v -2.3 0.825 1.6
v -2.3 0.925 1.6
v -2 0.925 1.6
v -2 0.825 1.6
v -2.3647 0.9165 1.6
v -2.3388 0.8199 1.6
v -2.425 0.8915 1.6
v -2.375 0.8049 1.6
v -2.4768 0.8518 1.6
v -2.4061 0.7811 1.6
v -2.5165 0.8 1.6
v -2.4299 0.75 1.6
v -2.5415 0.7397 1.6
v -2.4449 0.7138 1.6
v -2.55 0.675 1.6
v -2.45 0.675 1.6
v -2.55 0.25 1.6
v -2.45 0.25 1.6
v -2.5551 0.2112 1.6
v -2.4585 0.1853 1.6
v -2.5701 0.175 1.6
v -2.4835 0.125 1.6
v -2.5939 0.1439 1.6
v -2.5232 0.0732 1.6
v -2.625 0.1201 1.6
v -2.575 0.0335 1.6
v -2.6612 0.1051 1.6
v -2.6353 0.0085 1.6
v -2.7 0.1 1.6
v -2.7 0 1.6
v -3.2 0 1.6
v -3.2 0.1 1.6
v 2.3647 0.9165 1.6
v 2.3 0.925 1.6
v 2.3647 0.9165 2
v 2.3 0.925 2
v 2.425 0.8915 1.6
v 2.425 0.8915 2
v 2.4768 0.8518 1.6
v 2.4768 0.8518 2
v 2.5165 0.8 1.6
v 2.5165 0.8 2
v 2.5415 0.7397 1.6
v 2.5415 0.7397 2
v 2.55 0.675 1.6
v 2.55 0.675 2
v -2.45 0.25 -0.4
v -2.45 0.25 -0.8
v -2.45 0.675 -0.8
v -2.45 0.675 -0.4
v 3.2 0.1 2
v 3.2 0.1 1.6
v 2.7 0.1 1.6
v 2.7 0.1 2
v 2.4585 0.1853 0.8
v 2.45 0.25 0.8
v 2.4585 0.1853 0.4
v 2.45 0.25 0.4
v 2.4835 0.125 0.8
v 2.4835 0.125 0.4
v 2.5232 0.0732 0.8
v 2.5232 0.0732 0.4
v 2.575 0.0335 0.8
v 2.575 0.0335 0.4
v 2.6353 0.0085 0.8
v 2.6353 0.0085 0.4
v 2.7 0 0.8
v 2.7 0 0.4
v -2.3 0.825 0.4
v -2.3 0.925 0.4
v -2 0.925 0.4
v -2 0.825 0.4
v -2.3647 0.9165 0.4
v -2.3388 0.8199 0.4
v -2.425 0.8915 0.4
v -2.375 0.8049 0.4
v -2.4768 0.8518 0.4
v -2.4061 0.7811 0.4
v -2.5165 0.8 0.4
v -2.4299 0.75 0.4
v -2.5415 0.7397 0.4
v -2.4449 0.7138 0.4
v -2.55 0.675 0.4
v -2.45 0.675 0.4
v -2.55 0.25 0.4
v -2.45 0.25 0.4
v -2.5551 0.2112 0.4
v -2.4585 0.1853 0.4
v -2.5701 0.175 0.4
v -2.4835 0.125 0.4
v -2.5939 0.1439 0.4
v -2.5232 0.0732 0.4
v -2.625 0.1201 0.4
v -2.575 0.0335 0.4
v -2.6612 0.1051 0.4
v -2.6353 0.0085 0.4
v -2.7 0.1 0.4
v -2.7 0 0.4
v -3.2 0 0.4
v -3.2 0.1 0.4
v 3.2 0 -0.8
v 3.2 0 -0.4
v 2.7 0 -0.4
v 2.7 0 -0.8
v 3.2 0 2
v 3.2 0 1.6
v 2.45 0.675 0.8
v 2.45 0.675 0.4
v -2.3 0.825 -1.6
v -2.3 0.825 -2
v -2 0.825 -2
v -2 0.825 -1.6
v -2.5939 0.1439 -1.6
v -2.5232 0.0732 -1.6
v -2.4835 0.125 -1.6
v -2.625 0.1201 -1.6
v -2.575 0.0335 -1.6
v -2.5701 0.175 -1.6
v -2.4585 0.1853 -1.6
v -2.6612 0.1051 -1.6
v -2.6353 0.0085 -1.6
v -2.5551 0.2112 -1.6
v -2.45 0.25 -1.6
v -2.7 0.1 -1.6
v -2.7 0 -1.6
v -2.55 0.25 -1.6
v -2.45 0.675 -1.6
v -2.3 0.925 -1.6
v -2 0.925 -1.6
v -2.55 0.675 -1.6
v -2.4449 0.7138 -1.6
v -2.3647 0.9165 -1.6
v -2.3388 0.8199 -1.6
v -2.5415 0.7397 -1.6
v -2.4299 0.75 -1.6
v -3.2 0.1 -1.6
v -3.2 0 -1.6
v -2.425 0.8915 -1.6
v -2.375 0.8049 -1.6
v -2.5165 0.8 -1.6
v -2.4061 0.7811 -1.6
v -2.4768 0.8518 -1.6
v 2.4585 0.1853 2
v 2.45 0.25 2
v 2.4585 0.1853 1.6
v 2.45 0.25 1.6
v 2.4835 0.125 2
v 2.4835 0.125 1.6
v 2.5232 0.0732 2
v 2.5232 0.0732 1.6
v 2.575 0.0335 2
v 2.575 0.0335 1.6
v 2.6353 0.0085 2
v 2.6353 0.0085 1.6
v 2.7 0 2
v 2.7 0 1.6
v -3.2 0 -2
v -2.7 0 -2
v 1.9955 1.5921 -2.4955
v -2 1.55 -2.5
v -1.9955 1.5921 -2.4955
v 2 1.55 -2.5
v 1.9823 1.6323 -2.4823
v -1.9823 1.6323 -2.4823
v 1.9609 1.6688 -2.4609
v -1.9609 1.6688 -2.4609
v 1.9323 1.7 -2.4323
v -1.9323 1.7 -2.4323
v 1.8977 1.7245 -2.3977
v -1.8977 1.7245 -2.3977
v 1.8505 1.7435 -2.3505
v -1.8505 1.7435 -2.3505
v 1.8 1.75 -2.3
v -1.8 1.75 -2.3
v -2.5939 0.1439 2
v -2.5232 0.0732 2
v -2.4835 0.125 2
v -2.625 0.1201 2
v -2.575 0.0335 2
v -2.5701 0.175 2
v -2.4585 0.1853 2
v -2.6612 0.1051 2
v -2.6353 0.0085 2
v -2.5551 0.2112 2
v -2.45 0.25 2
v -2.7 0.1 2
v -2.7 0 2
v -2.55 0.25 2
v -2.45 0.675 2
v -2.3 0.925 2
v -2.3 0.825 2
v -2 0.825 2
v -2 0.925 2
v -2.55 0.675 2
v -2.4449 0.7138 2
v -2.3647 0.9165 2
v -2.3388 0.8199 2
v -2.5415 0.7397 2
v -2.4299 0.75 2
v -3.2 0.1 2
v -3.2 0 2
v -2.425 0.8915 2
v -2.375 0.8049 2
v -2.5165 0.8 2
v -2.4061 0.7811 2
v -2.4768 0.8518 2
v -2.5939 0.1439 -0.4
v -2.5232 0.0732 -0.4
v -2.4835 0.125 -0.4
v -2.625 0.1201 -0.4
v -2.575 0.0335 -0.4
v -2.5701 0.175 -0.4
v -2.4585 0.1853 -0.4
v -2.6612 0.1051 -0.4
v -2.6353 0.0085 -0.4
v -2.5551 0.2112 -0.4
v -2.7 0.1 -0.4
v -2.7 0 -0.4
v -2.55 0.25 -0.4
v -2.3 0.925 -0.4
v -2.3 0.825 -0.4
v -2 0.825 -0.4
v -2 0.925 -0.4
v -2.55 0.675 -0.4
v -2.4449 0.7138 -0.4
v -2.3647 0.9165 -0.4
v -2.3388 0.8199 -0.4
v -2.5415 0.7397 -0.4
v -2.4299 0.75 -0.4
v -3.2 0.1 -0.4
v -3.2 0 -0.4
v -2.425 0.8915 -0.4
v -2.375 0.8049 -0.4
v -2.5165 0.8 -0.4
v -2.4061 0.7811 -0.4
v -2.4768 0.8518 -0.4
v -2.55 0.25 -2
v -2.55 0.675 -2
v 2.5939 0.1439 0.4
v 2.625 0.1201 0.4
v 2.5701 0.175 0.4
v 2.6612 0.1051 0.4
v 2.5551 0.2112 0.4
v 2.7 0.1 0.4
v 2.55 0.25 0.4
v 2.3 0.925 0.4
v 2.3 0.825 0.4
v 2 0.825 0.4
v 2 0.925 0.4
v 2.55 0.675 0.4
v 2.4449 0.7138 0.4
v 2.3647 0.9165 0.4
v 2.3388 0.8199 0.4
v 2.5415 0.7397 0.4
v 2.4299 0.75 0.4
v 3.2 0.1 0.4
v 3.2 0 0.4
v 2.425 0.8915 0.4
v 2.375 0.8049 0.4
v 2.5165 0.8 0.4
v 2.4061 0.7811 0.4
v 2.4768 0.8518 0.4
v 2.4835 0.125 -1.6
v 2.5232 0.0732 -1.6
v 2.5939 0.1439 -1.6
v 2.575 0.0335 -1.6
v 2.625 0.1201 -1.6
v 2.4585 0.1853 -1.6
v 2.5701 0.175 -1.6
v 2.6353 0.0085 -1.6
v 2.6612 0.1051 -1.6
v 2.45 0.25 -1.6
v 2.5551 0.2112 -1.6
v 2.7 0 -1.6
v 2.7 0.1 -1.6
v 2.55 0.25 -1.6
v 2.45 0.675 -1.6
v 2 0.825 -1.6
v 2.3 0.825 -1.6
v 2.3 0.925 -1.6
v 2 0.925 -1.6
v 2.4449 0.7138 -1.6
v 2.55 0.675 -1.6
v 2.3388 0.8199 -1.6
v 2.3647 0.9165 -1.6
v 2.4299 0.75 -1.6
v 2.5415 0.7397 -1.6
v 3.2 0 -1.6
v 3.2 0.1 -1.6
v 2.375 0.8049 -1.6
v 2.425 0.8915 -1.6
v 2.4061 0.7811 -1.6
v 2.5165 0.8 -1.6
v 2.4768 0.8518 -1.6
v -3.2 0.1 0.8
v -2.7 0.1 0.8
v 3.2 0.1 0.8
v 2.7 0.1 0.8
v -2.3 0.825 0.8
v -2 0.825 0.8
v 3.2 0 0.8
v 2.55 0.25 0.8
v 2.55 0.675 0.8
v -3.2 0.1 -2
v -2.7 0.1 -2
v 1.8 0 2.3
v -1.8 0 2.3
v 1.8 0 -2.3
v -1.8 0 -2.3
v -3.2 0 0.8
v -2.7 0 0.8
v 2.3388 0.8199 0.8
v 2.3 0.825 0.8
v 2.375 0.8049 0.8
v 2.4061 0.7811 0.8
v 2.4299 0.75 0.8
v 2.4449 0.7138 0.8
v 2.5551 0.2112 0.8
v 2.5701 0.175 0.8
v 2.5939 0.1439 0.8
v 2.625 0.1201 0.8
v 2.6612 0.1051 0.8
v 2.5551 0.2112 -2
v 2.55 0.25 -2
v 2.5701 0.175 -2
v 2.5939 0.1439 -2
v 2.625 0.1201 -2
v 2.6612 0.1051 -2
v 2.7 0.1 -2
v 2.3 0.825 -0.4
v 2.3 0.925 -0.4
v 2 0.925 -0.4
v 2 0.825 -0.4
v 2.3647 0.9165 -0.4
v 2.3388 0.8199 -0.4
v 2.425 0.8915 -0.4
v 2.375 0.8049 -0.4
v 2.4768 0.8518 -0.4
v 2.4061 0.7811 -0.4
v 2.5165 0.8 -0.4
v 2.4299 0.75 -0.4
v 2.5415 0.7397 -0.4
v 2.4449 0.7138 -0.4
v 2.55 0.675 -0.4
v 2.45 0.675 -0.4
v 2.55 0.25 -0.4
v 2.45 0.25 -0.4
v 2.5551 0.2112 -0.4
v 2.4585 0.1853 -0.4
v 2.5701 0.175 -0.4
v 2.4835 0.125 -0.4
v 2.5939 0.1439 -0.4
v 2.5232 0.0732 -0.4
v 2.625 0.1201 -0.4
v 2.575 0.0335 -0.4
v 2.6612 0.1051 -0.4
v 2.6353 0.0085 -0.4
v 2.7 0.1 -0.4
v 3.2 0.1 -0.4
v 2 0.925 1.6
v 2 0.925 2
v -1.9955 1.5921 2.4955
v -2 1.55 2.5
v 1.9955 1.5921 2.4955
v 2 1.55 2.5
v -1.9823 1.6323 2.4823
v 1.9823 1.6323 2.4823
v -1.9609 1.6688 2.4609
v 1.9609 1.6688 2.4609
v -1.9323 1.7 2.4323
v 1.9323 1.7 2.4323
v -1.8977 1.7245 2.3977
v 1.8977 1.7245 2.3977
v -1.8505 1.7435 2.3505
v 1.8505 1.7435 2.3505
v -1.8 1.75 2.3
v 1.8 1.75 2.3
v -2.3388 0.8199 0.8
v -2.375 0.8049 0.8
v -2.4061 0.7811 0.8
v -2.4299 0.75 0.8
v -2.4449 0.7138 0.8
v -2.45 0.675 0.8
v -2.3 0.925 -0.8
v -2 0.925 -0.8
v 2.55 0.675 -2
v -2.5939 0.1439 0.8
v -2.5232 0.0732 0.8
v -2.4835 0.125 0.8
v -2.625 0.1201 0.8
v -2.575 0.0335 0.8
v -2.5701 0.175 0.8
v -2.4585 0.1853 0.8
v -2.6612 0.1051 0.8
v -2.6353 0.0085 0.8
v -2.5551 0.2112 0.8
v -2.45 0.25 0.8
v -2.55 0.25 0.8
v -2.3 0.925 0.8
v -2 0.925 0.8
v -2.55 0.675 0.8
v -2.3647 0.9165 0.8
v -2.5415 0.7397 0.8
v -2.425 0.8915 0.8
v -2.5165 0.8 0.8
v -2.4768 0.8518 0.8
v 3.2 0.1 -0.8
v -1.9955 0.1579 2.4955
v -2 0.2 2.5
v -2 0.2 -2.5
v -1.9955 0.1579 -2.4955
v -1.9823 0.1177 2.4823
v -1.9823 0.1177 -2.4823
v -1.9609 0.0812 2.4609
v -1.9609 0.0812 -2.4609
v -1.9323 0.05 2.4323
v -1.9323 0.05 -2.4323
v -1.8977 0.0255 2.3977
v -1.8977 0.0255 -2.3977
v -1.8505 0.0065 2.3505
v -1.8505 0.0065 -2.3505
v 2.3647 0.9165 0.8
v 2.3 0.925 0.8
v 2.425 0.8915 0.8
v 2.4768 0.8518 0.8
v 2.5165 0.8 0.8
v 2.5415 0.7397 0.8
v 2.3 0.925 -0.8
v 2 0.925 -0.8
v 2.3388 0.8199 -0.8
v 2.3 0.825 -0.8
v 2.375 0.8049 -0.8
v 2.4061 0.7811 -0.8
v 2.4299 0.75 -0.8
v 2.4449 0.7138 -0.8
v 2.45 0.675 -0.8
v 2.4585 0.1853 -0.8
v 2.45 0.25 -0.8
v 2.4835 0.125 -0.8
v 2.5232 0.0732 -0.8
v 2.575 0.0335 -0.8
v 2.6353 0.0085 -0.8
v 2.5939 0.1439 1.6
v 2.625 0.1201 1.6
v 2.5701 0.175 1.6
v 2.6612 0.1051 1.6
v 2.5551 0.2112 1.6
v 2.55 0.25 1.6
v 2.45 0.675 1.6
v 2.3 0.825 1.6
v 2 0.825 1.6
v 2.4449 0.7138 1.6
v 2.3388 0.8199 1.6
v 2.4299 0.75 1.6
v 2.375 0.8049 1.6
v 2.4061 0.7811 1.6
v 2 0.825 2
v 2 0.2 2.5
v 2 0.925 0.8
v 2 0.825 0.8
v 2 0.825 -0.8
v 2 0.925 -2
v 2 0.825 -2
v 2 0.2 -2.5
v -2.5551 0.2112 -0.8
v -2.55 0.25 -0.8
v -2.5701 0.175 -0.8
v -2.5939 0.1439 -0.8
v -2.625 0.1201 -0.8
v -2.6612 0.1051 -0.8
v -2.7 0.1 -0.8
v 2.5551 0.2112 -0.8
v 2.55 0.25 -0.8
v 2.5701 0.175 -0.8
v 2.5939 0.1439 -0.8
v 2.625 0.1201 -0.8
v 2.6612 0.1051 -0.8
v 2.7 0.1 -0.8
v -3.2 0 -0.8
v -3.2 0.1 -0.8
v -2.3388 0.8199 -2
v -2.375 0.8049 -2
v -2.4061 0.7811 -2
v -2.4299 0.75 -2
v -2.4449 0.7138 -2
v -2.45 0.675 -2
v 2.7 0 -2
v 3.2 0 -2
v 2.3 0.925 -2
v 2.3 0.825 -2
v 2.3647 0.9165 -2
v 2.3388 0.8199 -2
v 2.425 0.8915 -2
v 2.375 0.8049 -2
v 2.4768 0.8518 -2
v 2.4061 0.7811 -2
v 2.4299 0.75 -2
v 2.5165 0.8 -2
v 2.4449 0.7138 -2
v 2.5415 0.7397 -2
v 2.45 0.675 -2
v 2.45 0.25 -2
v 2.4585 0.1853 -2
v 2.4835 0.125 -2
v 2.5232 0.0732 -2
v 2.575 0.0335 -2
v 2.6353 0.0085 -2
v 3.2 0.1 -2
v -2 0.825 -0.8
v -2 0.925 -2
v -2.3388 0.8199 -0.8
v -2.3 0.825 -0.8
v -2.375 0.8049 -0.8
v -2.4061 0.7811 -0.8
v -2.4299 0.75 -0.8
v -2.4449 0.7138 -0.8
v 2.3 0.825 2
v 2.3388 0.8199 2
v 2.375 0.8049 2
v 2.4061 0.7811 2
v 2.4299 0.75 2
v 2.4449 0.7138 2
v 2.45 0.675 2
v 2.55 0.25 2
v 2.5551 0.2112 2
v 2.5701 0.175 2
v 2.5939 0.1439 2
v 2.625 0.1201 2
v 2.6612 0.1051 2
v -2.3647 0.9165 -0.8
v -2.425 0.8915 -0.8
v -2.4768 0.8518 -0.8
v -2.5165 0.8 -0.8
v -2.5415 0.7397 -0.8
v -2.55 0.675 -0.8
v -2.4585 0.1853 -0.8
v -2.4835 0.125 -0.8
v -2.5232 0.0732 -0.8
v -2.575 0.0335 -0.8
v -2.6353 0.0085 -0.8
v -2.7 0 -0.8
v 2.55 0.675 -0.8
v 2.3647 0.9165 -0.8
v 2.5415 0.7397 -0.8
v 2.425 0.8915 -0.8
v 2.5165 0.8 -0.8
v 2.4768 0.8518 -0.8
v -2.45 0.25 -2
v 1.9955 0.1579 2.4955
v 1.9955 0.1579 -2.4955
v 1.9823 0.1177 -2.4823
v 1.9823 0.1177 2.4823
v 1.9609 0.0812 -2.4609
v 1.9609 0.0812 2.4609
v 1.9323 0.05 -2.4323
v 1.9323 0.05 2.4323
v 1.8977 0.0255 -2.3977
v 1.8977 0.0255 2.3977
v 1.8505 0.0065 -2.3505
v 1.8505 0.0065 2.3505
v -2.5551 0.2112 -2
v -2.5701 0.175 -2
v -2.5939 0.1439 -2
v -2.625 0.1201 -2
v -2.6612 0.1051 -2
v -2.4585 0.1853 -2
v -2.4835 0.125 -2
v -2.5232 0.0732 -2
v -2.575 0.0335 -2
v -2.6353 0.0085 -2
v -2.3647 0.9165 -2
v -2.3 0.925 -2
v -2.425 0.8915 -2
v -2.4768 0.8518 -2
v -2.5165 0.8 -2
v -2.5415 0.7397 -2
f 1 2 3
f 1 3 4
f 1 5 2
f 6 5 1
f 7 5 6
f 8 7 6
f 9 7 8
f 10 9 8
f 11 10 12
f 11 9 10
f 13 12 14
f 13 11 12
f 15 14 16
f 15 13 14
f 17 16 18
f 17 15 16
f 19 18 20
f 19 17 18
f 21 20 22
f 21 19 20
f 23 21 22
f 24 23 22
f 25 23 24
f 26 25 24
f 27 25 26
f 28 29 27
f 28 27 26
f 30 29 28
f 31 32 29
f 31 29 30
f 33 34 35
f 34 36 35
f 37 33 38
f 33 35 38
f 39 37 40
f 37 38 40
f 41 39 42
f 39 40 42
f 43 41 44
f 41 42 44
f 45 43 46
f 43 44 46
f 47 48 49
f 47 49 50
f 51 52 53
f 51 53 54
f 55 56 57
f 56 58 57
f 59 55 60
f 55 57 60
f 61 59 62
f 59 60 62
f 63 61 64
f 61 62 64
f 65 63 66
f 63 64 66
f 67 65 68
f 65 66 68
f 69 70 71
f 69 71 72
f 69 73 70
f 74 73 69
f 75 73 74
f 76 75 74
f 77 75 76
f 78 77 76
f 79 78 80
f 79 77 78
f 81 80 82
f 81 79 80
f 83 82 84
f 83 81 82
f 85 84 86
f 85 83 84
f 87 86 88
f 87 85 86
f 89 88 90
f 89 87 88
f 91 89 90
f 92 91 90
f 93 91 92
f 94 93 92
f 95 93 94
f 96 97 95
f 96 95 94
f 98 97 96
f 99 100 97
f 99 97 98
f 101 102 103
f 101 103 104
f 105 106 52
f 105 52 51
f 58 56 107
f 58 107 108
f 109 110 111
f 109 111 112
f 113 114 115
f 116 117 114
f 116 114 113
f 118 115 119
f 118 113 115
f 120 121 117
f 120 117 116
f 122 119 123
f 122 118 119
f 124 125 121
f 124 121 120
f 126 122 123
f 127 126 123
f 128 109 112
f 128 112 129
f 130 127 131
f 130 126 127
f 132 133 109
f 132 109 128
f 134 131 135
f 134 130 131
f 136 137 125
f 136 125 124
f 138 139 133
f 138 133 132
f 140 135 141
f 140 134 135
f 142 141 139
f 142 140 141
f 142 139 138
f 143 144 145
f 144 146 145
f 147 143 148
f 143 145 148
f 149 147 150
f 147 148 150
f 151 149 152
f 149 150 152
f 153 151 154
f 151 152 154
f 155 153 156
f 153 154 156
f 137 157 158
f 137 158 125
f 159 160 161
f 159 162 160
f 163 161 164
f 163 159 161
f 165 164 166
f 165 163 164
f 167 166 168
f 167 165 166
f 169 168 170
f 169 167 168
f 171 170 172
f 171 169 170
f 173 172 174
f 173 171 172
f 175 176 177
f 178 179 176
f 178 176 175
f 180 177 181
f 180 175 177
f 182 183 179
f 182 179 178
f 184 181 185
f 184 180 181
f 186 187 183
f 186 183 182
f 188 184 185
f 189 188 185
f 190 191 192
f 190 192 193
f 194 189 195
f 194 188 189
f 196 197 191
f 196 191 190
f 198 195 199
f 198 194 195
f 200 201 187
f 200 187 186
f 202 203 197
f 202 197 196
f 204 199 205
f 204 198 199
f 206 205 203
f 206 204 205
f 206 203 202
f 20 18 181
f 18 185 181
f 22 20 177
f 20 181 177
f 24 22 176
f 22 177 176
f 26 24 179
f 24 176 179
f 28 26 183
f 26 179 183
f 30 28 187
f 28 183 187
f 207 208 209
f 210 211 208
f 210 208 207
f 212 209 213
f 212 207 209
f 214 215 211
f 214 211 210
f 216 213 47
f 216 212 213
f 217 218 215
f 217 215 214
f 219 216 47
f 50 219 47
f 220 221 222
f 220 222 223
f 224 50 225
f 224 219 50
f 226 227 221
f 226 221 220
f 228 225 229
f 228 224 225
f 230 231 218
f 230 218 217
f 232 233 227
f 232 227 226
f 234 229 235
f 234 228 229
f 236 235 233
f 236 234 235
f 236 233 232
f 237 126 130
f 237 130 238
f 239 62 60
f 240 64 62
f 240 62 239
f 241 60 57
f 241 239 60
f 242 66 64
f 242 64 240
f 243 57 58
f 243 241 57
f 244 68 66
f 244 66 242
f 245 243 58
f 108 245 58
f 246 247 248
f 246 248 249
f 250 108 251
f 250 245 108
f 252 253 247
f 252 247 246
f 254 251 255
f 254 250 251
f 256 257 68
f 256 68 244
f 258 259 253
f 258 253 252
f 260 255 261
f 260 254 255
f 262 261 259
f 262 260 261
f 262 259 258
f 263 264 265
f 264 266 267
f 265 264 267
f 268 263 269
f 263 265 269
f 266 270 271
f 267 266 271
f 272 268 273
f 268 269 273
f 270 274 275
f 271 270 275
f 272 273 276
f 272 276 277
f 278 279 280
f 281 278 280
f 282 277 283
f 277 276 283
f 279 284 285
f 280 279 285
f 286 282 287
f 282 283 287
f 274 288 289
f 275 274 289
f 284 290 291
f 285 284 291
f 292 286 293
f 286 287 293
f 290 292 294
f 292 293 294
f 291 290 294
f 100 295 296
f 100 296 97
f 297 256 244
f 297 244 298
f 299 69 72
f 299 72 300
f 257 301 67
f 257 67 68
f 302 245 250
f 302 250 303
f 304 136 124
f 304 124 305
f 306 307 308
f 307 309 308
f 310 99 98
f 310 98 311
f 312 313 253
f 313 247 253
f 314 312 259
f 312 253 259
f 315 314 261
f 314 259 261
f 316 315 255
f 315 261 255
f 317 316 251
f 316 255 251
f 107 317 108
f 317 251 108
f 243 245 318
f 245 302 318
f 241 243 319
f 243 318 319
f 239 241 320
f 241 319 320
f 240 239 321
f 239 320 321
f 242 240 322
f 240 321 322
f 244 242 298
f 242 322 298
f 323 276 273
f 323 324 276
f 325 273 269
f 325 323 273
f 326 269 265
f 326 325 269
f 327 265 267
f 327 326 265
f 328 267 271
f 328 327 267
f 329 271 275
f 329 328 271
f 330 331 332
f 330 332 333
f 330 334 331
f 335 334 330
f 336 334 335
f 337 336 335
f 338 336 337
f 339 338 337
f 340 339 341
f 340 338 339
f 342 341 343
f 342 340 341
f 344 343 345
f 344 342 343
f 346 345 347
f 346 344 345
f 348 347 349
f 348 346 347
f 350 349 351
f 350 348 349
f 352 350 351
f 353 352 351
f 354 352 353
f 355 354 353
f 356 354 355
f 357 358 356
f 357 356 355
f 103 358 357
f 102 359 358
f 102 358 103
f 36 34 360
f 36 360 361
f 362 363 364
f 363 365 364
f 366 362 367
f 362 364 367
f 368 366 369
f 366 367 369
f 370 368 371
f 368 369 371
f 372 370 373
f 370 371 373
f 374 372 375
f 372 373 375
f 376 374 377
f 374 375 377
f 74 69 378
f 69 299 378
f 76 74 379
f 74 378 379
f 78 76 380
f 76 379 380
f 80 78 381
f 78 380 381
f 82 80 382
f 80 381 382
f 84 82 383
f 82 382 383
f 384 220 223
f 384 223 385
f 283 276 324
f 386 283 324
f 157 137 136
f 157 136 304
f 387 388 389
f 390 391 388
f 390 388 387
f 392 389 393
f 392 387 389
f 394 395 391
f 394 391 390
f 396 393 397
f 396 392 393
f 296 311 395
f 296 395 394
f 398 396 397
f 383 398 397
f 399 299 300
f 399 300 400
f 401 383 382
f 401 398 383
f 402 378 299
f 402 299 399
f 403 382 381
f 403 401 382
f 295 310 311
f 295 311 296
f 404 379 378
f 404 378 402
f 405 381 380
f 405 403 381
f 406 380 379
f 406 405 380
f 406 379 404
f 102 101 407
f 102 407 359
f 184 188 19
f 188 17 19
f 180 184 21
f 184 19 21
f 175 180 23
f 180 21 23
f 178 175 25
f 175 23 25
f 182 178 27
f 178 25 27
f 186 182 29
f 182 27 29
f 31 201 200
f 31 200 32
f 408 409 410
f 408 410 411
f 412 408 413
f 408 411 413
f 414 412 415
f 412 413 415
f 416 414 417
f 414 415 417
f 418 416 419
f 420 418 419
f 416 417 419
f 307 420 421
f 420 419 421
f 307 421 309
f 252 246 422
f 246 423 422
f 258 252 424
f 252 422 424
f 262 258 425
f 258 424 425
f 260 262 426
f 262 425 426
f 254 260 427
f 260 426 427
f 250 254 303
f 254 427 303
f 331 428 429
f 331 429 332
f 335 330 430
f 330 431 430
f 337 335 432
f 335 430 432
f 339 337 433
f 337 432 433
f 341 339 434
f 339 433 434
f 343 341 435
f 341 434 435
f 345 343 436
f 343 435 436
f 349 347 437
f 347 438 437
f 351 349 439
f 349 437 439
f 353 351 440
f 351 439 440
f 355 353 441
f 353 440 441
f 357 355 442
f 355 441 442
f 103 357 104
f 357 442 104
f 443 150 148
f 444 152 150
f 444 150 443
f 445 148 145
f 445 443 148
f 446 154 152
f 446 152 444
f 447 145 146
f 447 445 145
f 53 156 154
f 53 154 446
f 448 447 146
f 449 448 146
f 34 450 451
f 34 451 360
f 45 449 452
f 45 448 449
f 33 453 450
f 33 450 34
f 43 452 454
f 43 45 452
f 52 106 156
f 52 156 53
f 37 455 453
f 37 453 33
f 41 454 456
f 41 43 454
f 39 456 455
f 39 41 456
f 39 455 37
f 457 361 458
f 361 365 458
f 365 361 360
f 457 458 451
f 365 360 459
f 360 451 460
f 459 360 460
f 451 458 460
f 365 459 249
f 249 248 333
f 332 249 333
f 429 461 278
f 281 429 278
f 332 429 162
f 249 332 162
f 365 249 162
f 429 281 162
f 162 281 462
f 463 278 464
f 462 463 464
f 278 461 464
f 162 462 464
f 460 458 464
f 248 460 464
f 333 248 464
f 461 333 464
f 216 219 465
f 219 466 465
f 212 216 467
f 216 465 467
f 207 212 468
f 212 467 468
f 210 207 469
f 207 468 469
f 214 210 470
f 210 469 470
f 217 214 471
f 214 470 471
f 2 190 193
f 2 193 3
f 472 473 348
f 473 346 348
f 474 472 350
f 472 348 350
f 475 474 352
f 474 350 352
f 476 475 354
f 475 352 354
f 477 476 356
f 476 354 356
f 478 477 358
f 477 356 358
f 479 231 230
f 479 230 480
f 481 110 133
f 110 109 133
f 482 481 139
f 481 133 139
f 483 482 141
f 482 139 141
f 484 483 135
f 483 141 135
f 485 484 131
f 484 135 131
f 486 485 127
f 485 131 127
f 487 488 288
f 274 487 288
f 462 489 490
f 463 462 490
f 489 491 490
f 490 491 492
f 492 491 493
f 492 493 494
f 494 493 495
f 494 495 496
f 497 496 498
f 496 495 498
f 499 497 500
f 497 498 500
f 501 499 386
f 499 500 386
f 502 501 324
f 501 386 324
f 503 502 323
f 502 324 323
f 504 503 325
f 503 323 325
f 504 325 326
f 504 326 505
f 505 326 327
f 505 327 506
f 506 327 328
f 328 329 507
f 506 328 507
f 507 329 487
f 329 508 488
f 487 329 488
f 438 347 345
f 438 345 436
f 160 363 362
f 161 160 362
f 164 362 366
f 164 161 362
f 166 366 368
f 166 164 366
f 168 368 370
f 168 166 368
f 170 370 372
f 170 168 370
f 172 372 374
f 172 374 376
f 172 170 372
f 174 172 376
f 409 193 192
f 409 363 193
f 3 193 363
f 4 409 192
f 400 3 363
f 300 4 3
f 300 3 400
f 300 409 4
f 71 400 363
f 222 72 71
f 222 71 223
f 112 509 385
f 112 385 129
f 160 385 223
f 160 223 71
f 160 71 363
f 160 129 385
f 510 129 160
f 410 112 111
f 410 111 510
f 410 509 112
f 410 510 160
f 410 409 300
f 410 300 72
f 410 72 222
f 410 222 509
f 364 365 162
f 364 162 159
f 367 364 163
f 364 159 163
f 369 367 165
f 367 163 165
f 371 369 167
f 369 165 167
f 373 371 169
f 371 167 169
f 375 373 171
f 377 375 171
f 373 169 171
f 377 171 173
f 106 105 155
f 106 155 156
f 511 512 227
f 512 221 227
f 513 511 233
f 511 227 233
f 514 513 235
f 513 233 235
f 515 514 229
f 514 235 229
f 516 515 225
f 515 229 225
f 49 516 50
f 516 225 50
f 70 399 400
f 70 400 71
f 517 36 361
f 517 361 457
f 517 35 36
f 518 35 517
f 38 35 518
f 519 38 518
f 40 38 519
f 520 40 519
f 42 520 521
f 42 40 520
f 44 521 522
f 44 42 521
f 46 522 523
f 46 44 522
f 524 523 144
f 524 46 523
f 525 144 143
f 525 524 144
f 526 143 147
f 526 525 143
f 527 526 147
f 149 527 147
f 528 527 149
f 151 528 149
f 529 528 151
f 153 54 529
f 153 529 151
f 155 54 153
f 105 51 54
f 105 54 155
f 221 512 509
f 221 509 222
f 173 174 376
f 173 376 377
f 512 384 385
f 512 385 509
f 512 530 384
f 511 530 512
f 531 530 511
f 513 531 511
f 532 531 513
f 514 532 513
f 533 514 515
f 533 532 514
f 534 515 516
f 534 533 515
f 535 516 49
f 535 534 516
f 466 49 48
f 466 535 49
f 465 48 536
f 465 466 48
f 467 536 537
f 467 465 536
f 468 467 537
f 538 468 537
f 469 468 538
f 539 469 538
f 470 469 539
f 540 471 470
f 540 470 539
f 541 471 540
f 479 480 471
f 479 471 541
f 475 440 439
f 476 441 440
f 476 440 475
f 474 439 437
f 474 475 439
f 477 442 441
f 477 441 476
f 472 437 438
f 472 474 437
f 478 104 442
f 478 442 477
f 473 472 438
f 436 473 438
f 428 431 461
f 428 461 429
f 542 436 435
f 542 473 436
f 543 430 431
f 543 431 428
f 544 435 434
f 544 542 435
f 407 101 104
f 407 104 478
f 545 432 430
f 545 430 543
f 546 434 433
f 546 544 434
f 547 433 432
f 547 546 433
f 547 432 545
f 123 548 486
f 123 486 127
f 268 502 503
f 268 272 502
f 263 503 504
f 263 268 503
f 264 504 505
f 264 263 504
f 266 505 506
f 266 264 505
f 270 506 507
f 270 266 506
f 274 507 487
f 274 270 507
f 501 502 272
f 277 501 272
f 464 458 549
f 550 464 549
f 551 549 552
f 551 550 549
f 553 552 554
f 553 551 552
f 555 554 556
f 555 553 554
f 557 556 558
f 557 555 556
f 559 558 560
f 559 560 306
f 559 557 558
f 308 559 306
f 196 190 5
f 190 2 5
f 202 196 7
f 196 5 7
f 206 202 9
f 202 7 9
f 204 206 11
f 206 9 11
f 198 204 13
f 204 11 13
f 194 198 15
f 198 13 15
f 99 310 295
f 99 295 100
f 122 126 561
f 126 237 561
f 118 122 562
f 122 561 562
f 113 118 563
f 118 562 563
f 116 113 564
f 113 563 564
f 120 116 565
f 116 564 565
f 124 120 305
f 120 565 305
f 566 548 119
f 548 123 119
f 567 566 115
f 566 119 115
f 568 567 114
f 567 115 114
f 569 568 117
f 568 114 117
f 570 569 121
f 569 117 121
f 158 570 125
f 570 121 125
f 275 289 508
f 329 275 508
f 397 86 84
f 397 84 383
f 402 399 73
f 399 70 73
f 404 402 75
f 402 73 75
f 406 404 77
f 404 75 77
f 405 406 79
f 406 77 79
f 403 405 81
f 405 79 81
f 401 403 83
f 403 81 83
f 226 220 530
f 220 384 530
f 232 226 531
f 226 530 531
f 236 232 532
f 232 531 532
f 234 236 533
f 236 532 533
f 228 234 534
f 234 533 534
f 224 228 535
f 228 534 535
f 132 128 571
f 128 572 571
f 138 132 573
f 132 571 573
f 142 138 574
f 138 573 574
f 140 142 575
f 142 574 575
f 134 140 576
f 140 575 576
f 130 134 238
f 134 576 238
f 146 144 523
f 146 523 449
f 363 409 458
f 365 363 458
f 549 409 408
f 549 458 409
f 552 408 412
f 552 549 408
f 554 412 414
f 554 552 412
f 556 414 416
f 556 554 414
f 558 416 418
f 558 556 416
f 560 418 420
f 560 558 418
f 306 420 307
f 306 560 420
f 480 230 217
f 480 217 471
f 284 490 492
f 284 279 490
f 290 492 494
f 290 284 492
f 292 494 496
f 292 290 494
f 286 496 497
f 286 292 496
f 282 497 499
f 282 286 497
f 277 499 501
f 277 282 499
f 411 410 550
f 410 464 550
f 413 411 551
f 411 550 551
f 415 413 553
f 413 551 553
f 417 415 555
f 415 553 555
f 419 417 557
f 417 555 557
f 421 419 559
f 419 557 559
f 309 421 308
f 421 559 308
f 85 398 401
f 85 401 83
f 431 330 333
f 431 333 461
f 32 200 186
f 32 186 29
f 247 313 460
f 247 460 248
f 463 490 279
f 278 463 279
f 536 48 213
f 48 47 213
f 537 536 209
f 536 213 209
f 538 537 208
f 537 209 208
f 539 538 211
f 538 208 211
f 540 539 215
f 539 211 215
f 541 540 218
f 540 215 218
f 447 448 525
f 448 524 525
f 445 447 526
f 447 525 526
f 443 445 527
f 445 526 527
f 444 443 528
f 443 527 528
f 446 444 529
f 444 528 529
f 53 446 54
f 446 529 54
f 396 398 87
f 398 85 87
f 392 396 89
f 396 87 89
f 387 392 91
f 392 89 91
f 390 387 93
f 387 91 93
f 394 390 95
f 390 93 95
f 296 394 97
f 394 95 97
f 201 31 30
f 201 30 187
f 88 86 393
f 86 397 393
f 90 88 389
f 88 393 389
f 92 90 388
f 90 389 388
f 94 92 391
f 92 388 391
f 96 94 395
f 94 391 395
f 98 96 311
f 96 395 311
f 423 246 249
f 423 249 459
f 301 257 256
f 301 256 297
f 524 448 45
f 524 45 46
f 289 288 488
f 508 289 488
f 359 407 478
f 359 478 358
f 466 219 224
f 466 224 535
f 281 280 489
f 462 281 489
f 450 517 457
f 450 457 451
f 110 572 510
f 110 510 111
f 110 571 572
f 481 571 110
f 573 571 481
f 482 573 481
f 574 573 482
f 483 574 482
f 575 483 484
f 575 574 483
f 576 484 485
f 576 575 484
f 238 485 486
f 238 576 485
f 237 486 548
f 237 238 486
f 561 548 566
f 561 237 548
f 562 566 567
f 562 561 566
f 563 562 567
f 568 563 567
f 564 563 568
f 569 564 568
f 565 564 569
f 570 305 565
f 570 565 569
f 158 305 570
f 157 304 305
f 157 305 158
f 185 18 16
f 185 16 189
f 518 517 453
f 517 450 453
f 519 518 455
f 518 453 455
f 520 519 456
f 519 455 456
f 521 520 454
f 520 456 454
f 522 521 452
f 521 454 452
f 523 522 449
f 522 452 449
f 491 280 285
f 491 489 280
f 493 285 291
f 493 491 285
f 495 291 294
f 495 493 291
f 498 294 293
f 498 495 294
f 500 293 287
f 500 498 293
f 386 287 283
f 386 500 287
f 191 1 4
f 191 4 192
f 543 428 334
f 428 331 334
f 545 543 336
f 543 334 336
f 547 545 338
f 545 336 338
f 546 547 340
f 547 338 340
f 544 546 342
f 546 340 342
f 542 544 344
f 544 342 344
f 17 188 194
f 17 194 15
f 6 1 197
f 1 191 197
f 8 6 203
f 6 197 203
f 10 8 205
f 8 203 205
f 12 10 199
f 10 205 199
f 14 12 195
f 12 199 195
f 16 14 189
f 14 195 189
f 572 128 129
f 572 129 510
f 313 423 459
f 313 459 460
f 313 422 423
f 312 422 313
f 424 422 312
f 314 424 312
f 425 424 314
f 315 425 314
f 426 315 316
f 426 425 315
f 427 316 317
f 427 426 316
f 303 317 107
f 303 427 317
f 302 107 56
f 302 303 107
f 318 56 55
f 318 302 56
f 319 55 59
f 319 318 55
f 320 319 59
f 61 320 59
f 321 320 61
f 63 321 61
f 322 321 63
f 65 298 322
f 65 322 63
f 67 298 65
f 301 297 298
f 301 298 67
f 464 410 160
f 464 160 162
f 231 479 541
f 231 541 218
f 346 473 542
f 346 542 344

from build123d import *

# Parameters (mm, degrees)
SKETCH1_W               = 4
SKETCH1_H               = 5
BOSS_EXTRUDE1_DEPTH     = 1.75
FILLET1_R               = 0.2
SKETCH3_W               = 0.4
SKETCH3_H               = 0.1
LPATTERN1_COUNT         = 4
LPATTERN1_PITCH         = 1.2
MIRROR1_COPY_1_SKETCH_W = 0.4
MIRROR1_COPY_1_SKETCH_H = 0.1
MIRROR1_COPY_2_SKETCH_W = 0.4
MIRROR1_COPY_2_SKETCH_H = 0.1
MIRROR1_COPY_3_SKETCH_W = 0.4
MIRROR1_COPY_3_SKETCH_H = 0.1


with BuildPart() as part:
    # Sketch1 → Boss-Extrude1 (new body)
    with BuildSketch(Plane(origin=(0, 0, 0), x_dir=(1, 0, 0), z_dir=(0, 1, 0))):
        Rectangle(SKETCH1_W, SKETCH1_H)
    extrude(amount=BOSS_EXTRUDE1_DEPTH)

    # Fillet1
    fillet1_edges = [part.edges().sort_by_distance(p)[0] for p in [
        (-2, 1.75, 0),
        (0, 1.75, 2.5),
        (2, 1.75, 0),
        (0, 0, 2.5),
        (-2, 0, 0),
        (0, 0, -2.5),
        (2, 0, 0),
        (0, 1.75, -2.5),
    ]]
    fillet(fillet1_edges, radius=FILLET1_R)

    # Sweep1: sweep along a path in Sketch2
    with BuildLine(Plane(origin=(0, 0, -1.8), x_dir=(-1, 0, 0), z_dir=(0, 0, -1))) as sweep1_path:
        Line((2, 0.875), (2.3, 0.875))
        ThreePointArc((2.3, 0.875), (2.441421356, 0.816421356), (2.5, 0.675))
        Line((2.5, 0.675), (2.5, 0.25))
        ThreePointArc((2.5, 0.25), (2.558578644, 0.108578644), (2.7, 0.05))
        Line((2.7, 0.05), (3.2, 0.05))
    # Sketch3 → Sweep1 (sweep)
    with BuildSketch(Plane.ZY.offset(2)):
        with Locations((-1.8, 0.875)):
            Rectangle(SKETCH3_W, SKETCH3_H)
    sweep1 = sweep(path=sweep1_path.line)

    # LPattern1: Sweep1 ×4
    with Locations(*[(0, 0, i * LPATTERN1_PITCH) for i in range(1, LPATTERN1_COUNT)]):
        add(sweep1)

    # Mirror1: Sweep1 across plane
    add(sweep1.mirror(Plane(origin=(0, 0, 0), x_dir=(0, 0, 1), z_dir=(1, 0, 0))))

    # Mirror1 copy 1: sweep along a path in Mirror1 copy 1 path
    with BuildLine(Plane(origin=(0, 0, -0.6), x_dir=(1, 0, 0), z_dir=(0, 0, -1))) as mirror1_copy_1_path:
        Line((2, -0.875), (2.3, -0.875))
        ThreePointArc((2.3, -0.875), (2.441421356, -0.816421356), (2.5, -0.675))
        Line((2.5, -0.675), (2.5, -0.25))
        ThreePointArc((2.5, -0.25), (2.558578644, -0.108578644), (2.7, -0.05))
        Line((2.7, -0.05), (3.2, -0.05))
    # Mirror1 copy 1 sketch → Mirror1 copy 1 (sweep)
    with BuildSketch(Plane(origin=(2, 0, 1.2), x_dir=(0, 0, 1), z_dir=(1, 0, 0))):
        with Locations((-1.8, -0.875)):
            Rectangle(MIRROR1_COPY_1_SKETCH_W, MIRROR1_COPY_1_SKETCH_H)
    sweep(path=mirror1_copy_1_path.line)

    # Mirror1 copy 2: sweep along a path in Mirror1 copy 2 path
    with BuildLine(Plane(origin=(0, 0, 0.6), x_dir=(1, 0, 0), z_dir=(0, 0, -1))) as mirror1_copy_2_path:
        Line((2, -0.875), (2.3, -0.875))
        ThreePointArc((2.3, -0.875), (2.441421356, -0.816421356), (2.5, -0.675))
        Line((2.5, -0.675), (2.5, -0.25))
        ThreePointArc((2.5, -0.25), (2.558578644, -0.108578644), (2.7, -0.05))
        Line((2.7, -0.05), (3.2, -0.05))
    # Mirror1 copy 2 sketch → Mirror1 copy 2 (sweep)
    with BuildSketch(Plane(origin=(2, 0, 2.4), x_dir=(0, 0, 1), z_dir=(1, 0, 0))):
        with Locations((-1.8, -0.875)):
            Rectangle(MIRROR1_COPY_2_SKETCH_W, MIRROR1_COPY_2_SKETCH_H)
    sweep(path=mirror1_copy_2_path.line)

    # Mirror1 copy 3: sweep along a path in Mirror1 copy 3 path
    with BuildLine(Plane(origin=(0, 0, 1.8), x_dir=(1, 0, 0), z_dir=(0, 0, -1))) as mirror1_copy_3_path:
        Line((2, -0.875), (2.3, -0.875))
        ThreePointArc((2.3, -0.875), (2.441421356, -0.816421356), (2.5, -0.675))
        Line((2.5, -0.675), (2.5, -0.25))
        ThreePointArc((2.5, -0.25), (2.558578644, -0.108578644), (2.7, -0.05))
        Line((2.7, -0.05), (3.2, -0.05))
    # Mirror1 copy 3 sketch → Mirror1 copy 3 (sweep)
    with BuildSketch(Plane(origin=(2, 0, 3.6), x_dir=(0, 0, 1), z_dir=(1, 0, 0))):
        with Locations((-1.8, -0.875)):
            Rectangle(MIRROR1_COPY_3_SKETCH_W, MIRROR1_COPY_3_SKETCH_H)
    sweep(path=mirror1_copy_3_path.line)


solid = part.part
